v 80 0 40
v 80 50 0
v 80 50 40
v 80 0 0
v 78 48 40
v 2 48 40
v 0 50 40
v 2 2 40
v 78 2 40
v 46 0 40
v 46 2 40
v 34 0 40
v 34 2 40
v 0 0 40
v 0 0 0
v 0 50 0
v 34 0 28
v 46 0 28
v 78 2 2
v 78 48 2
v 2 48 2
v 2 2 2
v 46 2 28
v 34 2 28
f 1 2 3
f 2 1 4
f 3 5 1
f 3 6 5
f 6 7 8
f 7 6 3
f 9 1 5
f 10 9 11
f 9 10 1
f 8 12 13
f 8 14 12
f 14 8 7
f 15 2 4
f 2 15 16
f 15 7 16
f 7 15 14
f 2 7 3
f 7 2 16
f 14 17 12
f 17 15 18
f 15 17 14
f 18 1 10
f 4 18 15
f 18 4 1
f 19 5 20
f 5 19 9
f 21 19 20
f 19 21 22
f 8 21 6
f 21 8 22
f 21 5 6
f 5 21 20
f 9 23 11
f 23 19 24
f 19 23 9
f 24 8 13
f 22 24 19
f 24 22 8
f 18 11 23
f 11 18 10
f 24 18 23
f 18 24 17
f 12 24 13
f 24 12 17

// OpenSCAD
$fn = 32;

// ----------------------------------------------------------------------
// Enclosure box: notch enclosure
// ----------------------------------------------------------------------

// --- parameters (mm) ---
box_l = 80;               // outer length, X
box_w = 50;               // outer width, Y
box_h = 40;               // outer height
wall_t = 2;               // wall thickness
notch_w = 12;             // cable notch width
notch_h = 12;             // cable notch height

inner_h = box_h - wall_t;  // cavity depth
boss_h = inner_h - 2;  // corner boss height

difference() {
  union() {
    difference() {
      cube([box_l, box_w, box_h]);
      translate([wall_t, wall_t, wall_t])
        cube([box_l - 2 * wall_t, box_w - 2 * wall_t, box_h]);
    }
  }
  translate([box_l / 2 - notch_w / 2, -1, box_h - notch_h])
    cube([notch_w, wall_t + 2, notch_h + 1]);
}
